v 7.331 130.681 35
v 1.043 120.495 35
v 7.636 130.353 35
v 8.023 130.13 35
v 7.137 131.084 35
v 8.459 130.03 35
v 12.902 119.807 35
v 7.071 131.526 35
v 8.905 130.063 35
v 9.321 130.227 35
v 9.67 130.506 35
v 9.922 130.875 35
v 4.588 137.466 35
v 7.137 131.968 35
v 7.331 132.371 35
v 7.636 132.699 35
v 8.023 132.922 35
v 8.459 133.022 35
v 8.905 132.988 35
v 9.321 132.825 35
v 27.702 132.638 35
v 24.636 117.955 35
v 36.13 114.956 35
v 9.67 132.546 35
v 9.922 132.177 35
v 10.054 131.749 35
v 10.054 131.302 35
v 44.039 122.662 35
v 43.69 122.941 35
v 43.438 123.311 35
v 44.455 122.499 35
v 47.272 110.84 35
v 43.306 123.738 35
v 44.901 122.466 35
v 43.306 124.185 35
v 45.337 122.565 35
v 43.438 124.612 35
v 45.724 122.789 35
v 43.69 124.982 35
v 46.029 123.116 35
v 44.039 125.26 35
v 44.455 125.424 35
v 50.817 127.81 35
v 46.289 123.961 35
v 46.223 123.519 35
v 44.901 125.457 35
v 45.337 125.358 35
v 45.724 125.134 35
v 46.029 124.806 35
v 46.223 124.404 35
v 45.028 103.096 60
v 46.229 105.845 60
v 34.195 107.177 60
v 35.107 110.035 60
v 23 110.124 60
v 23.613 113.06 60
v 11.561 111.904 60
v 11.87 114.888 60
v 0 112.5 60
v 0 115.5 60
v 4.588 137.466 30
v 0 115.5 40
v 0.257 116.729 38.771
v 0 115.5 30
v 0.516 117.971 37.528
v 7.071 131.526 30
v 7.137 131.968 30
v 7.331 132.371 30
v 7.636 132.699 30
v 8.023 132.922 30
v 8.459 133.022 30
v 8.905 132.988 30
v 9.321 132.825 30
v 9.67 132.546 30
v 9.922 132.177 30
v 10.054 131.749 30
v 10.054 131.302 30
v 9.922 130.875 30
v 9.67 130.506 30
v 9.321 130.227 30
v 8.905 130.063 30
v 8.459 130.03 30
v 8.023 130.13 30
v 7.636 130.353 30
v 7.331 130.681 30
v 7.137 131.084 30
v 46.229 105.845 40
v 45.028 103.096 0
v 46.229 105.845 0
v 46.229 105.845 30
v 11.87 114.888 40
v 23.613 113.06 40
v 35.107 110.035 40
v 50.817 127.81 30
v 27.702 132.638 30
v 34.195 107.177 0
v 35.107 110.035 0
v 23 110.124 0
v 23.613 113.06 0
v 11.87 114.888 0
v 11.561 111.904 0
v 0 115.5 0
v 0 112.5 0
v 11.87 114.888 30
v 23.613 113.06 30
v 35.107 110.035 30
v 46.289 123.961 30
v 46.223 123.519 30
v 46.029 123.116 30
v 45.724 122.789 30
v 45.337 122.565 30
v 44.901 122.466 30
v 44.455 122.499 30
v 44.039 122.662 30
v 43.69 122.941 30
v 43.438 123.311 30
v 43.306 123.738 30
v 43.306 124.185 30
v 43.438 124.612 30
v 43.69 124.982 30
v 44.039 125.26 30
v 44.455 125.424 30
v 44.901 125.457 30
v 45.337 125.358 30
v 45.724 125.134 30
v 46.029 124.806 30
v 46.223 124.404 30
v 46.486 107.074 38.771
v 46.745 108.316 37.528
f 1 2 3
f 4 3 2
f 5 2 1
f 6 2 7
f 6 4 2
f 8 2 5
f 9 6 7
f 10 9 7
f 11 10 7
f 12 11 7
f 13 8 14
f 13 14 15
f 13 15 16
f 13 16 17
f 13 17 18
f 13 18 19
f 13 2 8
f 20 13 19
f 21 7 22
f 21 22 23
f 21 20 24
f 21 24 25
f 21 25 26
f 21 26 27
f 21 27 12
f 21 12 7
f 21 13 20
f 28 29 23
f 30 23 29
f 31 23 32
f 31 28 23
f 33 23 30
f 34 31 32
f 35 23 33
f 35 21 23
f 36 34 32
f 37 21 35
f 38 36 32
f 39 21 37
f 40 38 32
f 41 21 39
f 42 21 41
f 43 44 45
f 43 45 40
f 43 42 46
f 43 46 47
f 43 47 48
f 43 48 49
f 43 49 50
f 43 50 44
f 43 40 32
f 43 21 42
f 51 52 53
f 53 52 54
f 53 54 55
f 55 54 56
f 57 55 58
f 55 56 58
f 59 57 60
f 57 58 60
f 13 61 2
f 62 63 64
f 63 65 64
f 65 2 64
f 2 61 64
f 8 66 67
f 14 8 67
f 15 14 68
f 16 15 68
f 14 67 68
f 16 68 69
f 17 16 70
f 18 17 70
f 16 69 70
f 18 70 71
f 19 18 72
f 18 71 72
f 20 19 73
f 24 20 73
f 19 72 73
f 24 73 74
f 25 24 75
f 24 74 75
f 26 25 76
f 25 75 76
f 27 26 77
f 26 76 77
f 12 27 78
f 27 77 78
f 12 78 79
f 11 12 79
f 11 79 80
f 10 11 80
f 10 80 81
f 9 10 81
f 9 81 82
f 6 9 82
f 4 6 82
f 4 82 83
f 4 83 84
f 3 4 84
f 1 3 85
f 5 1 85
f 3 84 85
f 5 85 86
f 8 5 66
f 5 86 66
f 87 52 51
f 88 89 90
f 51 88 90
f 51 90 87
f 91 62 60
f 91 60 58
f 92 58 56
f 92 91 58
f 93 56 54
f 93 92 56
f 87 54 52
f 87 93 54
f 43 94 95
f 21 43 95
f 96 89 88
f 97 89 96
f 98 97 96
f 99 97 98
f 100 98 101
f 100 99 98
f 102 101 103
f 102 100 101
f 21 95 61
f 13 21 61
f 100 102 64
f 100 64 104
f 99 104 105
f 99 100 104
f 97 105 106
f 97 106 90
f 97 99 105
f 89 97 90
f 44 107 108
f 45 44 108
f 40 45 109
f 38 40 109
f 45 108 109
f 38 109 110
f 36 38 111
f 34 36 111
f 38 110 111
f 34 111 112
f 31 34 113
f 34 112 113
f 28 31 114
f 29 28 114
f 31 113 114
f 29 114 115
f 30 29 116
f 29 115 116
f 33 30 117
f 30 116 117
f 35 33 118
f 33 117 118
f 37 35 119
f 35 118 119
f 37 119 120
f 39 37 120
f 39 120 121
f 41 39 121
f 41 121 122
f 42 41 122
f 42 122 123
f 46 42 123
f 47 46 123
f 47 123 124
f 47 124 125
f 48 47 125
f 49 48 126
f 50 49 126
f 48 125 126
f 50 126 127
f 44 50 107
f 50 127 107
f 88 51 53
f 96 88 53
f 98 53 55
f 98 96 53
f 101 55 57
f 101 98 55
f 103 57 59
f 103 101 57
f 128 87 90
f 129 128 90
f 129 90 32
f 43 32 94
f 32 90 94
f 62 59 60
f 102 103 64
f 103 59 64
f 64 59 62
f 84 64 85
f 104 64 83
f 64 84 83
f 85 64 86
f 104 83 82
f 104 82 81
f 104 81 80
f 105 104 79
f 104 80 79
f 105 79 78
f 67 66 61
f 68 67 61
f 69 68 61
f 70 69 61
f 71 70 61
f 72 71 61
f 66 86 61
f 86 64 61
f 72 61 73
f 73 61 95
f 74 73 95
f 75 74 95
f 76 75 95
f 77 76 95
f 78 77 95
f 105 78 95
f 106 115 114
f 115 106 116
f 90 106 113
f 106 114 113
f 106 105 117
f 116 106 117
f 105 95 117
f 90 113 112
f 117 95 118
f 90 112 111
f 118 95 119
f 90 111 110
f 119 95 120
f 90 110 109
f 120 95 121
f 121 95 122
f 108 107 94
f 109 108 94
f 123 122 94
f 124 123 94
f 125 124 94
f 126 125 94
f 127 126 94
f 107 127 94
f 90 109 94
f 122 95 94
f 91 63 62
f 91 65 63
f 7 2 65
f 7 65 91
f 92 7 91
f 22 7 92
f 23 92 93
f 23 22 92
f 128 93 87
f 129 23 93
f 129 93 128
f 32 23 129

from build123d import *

# Parameters (mm, degrees)
EXTRUDE_1_DEPTH = 60
EXTRUDE_START   = 5
SKETCH_2_R      = 1.5
EXTRUDE_2_DEPTH = 5
CHAMFER_1_SIZE  = 5


with BuildPart() as part:
    # 草图1 → 凸台-拉伸1 (new body)
    with BuildSketch(Plane.XY):
        with BuildLine():
            Line((0, 112.5), (0, 115.5))
            ThreePointArc((0, 115.5), (23.613333333, 113.060428484), (46.22915298, 105.84477037))
            Line((46.22915298, 105.84477037), (45.02839576, 103.095555556))
            ThreePointArc((45.02839576, 103.095555556), (23, 110.123793978), (0, 112.5))
        make_face()
    extrude(amount=EXTRUDE_1_DEPTH)

    # 草图2 → 凸台-拉伸2 (add)
    with BuildSketch(Plane(origin=(0, 0, 35), x_dir=(-1, 0, 0), z_dir=(0, 0, -1)).offset(EXTRUDE_START)):
        with BuildLine():
            Line((-27.702222222, 132.637991857), (-4.587645732, 137.465606672))
            Line((-4.587645732, 137.465606672), (0, 115.5))
            ThreePointArc((0, 115.5), (-23.613333333, 113.060428484), (-46.22915298, 105.84477037))
            Line((-46.22915298, 105.84477037), (-50.816798712, 127.810377043))
            Line((-50.816798712, 127.810377043), (-27.702222222, 132.637991857))
        make_face()
        with Locations((-8.570753879, 131.525823236)):
            Circle(SKETCH_2_R, mode=Mode.SUBTRACT)
        with Locations(Location((-44.789246121, 123.961378792, 0), (0, 0, 180))):
            Circle(SKETCH_2_R, mode=Mode.SUBTRACT)
    extrude(amount=-EXTRUDE_2_DEPTH)

    # 倒角1
    chamfer_1_edges = [part.edges().sort_by_distance(p)[0] for p in [
        (23.613333333, 113.060428484, 35),
    ]]
    chamfer(chamfer_1_edges, length=CHAMFER_1_SIZE)


solid = part.part
